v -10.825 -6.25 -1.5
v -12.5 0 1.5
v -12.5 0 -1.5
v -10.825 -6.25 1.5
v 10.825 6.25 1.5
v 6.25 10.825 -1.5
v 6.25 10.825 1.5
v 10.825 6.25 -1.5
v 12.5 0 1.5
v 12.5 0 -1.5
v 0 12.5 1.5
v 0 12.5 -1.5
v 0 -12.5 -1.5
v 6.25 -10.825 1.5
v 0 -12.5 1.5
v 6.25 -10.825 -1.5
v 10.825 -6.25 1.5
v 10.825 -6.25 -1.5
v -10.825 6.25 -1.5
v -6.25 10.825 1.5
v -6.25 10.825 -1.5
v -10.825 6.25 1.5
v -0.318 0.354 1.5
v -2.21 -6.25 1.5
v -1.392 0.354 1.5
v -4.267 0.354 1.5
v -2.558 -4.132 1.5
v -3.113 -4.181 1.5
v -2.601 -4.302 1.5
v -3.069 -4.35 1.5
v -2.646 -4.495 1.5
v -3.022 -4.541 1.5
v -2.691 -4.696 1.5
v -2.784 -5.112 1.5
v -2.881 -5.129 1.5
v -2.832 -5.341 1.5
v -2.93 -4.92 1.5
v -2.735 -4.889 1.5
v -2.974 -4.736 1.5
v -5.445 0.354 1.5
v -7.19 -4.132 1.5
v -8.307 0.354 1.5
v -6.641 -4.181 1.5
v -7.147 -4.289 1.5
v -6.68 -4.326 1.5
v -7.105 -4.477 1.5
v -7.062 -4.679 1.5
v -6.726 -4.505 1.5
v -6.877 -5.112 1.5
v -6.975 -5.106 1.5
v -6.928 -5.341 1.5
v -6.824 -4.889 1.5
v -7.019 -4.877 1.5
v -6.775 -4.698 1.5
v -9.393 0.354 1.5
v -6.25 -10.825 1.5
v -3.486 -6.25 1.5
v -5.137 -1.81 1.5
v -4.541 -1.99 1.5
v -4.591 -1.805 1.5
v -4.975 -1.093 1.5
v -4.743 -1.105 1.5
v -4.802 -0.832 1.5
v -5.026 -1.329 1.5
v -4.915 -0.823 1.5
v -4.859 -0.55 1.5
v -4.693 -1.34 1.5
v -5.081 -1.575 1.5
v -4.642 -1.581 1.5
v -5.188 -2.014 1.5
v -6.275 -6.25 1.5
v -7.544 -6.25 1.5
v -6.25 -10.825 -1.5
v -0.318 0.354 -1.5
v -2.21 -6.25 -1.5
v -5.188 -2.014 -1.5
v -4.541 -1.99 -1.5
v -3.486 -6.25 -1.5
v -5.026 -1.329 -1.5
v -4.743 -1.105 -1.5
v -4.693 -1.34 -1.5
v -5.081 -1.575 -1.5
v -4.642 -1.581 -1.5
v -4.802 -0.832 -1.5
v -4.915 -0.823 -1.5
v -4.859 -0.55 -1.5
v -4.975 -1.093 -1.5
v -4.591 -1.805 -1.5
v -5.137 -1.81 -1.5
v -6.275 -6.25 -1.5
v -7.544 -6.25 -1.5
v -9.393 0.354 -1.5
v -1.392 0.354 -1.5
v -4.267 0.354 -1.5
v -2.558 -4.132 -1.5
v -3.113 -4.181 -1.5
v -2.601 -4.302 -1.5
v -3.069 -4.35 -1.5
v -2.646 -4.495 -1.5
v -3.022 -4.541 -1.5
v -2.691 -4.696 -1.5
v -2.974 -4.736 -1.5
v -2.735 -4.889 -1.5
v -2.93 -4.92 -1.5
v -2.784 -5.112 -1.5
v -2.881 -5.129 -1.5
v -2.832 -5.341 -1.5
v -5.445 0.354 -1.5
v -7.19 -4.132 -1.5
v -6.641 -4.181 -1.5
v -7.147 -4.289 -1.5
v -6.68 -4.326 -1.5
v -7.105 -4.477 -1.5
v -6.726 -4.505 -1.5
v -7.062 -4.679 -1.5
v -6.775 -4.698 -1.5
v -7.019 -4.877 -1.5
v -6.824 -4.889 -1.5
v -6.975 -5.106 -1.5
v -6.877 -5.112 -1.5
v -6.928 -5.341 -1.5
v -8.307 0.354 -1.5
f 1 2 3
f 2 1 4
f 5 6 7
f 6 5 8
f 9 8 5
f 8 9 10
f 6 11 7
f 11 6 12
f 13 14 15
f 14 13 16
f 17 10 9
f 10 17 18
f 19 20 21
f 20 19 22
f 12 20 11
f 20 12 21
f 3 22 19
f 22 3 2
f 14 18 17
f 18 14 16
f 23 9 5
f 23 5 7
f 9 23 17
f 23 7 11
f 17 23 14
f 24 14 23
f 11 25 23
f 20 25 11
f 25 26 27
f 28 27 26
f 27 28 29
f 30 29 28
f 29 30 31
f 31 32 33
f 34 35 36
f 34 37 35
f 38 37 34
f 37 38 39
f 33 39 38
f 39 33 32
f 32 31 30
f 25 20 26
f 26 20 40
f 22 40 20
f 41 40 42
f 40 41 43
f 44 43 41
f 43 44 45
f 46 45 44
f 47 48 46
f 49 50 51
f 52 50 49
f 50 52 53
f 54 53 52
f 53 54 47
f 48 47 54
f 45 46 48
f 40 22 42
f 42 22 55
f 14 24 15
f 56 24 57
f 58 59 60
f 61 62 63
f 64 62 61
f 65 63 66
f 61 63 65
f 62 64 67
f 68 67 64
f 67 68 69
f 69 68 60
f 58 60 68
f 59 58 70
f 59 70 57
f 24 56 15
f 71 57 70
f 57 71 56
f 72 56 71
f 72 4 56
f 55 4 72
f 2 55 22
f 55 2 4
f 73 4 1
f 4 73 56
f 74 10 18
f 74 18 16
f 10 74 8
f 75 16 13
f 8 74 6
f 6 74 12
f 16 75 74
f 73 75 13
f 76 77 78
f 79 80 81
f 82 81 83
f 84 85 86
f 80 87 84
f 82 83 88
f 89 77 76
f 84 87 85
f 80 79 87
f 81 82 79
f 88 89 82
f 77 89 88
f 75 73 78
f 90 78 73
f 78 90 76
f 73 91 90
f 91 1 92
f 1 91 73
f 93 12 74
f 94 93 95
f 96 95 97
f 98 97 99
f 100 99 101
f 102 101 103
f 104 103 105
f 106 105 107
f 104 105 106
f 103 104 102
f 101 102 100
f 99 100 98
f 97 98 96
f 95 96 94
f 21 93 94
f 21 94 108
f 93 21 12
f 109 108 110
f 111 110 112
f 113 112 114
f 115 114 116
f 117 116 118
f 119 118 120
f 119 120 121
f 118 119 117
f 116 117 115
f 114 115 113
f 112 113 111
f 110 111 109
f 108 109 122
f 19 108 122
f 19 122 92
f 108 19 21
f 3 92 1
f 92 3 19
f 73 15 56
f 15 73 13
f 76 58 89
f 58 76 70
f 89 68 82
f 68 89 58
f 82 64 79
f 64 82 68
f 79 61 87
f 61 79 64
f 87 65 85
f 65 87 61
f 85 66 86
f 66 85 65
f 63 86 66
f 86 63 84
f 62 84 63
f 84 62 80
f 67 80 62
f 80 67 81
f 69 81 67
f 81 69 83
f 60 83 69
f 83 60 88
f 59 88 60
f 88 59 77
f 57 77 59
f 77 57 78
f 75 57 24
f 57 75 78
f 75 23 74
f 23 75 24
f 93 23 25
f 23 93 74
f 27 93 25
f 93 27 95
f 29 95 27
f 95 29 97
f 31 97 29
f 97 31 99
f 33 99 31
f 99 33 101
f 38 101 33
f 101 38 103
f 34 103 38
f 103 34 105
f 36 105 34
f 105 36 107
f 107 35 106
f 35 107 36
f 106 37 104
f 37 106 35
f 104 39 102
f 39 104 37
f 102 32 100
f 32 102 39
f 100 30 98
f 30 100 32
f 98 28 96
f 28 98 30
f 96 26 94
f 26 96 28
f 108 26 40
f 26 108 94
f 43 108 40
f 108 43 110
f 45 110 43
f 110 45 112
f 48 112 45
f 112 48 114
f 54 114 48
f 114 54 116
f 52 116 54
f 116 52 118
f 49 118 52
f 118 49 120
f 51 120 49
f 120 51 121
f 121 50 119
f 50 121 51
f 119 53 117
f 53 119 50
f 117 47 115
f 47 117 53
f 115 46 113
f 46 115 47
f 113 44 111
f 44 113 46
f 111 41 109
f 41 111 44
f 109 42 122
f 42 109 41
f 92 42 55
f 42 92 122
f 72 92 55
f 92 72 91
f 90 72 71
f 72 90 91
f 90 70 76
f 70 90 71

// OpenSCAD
$fn=12;

// unit is mm

diameter = 25;
thickness = 3;
slit_width = 0.8;
arrow_base = 7;

diameter_2 = diameter / 2;


module slot(level) {

  difference() {

    union() {
      cylinder(d=diameter, h=thickness, center=true);
    }

    union() {

      //#translate([ -0.3 * diameter_2, -0.3 * diameter_2, -thickness ])
      //  linear_extrude(2 * thickness)
      //  text("\u26E4", size=10);
      translate([ -0.75 * diameter_2, -0.5 * diameter_2, -thickness ])
        linear_extrude(2 * thickness)
        text(level, size=9);
    }
  }
}

slot("w");
